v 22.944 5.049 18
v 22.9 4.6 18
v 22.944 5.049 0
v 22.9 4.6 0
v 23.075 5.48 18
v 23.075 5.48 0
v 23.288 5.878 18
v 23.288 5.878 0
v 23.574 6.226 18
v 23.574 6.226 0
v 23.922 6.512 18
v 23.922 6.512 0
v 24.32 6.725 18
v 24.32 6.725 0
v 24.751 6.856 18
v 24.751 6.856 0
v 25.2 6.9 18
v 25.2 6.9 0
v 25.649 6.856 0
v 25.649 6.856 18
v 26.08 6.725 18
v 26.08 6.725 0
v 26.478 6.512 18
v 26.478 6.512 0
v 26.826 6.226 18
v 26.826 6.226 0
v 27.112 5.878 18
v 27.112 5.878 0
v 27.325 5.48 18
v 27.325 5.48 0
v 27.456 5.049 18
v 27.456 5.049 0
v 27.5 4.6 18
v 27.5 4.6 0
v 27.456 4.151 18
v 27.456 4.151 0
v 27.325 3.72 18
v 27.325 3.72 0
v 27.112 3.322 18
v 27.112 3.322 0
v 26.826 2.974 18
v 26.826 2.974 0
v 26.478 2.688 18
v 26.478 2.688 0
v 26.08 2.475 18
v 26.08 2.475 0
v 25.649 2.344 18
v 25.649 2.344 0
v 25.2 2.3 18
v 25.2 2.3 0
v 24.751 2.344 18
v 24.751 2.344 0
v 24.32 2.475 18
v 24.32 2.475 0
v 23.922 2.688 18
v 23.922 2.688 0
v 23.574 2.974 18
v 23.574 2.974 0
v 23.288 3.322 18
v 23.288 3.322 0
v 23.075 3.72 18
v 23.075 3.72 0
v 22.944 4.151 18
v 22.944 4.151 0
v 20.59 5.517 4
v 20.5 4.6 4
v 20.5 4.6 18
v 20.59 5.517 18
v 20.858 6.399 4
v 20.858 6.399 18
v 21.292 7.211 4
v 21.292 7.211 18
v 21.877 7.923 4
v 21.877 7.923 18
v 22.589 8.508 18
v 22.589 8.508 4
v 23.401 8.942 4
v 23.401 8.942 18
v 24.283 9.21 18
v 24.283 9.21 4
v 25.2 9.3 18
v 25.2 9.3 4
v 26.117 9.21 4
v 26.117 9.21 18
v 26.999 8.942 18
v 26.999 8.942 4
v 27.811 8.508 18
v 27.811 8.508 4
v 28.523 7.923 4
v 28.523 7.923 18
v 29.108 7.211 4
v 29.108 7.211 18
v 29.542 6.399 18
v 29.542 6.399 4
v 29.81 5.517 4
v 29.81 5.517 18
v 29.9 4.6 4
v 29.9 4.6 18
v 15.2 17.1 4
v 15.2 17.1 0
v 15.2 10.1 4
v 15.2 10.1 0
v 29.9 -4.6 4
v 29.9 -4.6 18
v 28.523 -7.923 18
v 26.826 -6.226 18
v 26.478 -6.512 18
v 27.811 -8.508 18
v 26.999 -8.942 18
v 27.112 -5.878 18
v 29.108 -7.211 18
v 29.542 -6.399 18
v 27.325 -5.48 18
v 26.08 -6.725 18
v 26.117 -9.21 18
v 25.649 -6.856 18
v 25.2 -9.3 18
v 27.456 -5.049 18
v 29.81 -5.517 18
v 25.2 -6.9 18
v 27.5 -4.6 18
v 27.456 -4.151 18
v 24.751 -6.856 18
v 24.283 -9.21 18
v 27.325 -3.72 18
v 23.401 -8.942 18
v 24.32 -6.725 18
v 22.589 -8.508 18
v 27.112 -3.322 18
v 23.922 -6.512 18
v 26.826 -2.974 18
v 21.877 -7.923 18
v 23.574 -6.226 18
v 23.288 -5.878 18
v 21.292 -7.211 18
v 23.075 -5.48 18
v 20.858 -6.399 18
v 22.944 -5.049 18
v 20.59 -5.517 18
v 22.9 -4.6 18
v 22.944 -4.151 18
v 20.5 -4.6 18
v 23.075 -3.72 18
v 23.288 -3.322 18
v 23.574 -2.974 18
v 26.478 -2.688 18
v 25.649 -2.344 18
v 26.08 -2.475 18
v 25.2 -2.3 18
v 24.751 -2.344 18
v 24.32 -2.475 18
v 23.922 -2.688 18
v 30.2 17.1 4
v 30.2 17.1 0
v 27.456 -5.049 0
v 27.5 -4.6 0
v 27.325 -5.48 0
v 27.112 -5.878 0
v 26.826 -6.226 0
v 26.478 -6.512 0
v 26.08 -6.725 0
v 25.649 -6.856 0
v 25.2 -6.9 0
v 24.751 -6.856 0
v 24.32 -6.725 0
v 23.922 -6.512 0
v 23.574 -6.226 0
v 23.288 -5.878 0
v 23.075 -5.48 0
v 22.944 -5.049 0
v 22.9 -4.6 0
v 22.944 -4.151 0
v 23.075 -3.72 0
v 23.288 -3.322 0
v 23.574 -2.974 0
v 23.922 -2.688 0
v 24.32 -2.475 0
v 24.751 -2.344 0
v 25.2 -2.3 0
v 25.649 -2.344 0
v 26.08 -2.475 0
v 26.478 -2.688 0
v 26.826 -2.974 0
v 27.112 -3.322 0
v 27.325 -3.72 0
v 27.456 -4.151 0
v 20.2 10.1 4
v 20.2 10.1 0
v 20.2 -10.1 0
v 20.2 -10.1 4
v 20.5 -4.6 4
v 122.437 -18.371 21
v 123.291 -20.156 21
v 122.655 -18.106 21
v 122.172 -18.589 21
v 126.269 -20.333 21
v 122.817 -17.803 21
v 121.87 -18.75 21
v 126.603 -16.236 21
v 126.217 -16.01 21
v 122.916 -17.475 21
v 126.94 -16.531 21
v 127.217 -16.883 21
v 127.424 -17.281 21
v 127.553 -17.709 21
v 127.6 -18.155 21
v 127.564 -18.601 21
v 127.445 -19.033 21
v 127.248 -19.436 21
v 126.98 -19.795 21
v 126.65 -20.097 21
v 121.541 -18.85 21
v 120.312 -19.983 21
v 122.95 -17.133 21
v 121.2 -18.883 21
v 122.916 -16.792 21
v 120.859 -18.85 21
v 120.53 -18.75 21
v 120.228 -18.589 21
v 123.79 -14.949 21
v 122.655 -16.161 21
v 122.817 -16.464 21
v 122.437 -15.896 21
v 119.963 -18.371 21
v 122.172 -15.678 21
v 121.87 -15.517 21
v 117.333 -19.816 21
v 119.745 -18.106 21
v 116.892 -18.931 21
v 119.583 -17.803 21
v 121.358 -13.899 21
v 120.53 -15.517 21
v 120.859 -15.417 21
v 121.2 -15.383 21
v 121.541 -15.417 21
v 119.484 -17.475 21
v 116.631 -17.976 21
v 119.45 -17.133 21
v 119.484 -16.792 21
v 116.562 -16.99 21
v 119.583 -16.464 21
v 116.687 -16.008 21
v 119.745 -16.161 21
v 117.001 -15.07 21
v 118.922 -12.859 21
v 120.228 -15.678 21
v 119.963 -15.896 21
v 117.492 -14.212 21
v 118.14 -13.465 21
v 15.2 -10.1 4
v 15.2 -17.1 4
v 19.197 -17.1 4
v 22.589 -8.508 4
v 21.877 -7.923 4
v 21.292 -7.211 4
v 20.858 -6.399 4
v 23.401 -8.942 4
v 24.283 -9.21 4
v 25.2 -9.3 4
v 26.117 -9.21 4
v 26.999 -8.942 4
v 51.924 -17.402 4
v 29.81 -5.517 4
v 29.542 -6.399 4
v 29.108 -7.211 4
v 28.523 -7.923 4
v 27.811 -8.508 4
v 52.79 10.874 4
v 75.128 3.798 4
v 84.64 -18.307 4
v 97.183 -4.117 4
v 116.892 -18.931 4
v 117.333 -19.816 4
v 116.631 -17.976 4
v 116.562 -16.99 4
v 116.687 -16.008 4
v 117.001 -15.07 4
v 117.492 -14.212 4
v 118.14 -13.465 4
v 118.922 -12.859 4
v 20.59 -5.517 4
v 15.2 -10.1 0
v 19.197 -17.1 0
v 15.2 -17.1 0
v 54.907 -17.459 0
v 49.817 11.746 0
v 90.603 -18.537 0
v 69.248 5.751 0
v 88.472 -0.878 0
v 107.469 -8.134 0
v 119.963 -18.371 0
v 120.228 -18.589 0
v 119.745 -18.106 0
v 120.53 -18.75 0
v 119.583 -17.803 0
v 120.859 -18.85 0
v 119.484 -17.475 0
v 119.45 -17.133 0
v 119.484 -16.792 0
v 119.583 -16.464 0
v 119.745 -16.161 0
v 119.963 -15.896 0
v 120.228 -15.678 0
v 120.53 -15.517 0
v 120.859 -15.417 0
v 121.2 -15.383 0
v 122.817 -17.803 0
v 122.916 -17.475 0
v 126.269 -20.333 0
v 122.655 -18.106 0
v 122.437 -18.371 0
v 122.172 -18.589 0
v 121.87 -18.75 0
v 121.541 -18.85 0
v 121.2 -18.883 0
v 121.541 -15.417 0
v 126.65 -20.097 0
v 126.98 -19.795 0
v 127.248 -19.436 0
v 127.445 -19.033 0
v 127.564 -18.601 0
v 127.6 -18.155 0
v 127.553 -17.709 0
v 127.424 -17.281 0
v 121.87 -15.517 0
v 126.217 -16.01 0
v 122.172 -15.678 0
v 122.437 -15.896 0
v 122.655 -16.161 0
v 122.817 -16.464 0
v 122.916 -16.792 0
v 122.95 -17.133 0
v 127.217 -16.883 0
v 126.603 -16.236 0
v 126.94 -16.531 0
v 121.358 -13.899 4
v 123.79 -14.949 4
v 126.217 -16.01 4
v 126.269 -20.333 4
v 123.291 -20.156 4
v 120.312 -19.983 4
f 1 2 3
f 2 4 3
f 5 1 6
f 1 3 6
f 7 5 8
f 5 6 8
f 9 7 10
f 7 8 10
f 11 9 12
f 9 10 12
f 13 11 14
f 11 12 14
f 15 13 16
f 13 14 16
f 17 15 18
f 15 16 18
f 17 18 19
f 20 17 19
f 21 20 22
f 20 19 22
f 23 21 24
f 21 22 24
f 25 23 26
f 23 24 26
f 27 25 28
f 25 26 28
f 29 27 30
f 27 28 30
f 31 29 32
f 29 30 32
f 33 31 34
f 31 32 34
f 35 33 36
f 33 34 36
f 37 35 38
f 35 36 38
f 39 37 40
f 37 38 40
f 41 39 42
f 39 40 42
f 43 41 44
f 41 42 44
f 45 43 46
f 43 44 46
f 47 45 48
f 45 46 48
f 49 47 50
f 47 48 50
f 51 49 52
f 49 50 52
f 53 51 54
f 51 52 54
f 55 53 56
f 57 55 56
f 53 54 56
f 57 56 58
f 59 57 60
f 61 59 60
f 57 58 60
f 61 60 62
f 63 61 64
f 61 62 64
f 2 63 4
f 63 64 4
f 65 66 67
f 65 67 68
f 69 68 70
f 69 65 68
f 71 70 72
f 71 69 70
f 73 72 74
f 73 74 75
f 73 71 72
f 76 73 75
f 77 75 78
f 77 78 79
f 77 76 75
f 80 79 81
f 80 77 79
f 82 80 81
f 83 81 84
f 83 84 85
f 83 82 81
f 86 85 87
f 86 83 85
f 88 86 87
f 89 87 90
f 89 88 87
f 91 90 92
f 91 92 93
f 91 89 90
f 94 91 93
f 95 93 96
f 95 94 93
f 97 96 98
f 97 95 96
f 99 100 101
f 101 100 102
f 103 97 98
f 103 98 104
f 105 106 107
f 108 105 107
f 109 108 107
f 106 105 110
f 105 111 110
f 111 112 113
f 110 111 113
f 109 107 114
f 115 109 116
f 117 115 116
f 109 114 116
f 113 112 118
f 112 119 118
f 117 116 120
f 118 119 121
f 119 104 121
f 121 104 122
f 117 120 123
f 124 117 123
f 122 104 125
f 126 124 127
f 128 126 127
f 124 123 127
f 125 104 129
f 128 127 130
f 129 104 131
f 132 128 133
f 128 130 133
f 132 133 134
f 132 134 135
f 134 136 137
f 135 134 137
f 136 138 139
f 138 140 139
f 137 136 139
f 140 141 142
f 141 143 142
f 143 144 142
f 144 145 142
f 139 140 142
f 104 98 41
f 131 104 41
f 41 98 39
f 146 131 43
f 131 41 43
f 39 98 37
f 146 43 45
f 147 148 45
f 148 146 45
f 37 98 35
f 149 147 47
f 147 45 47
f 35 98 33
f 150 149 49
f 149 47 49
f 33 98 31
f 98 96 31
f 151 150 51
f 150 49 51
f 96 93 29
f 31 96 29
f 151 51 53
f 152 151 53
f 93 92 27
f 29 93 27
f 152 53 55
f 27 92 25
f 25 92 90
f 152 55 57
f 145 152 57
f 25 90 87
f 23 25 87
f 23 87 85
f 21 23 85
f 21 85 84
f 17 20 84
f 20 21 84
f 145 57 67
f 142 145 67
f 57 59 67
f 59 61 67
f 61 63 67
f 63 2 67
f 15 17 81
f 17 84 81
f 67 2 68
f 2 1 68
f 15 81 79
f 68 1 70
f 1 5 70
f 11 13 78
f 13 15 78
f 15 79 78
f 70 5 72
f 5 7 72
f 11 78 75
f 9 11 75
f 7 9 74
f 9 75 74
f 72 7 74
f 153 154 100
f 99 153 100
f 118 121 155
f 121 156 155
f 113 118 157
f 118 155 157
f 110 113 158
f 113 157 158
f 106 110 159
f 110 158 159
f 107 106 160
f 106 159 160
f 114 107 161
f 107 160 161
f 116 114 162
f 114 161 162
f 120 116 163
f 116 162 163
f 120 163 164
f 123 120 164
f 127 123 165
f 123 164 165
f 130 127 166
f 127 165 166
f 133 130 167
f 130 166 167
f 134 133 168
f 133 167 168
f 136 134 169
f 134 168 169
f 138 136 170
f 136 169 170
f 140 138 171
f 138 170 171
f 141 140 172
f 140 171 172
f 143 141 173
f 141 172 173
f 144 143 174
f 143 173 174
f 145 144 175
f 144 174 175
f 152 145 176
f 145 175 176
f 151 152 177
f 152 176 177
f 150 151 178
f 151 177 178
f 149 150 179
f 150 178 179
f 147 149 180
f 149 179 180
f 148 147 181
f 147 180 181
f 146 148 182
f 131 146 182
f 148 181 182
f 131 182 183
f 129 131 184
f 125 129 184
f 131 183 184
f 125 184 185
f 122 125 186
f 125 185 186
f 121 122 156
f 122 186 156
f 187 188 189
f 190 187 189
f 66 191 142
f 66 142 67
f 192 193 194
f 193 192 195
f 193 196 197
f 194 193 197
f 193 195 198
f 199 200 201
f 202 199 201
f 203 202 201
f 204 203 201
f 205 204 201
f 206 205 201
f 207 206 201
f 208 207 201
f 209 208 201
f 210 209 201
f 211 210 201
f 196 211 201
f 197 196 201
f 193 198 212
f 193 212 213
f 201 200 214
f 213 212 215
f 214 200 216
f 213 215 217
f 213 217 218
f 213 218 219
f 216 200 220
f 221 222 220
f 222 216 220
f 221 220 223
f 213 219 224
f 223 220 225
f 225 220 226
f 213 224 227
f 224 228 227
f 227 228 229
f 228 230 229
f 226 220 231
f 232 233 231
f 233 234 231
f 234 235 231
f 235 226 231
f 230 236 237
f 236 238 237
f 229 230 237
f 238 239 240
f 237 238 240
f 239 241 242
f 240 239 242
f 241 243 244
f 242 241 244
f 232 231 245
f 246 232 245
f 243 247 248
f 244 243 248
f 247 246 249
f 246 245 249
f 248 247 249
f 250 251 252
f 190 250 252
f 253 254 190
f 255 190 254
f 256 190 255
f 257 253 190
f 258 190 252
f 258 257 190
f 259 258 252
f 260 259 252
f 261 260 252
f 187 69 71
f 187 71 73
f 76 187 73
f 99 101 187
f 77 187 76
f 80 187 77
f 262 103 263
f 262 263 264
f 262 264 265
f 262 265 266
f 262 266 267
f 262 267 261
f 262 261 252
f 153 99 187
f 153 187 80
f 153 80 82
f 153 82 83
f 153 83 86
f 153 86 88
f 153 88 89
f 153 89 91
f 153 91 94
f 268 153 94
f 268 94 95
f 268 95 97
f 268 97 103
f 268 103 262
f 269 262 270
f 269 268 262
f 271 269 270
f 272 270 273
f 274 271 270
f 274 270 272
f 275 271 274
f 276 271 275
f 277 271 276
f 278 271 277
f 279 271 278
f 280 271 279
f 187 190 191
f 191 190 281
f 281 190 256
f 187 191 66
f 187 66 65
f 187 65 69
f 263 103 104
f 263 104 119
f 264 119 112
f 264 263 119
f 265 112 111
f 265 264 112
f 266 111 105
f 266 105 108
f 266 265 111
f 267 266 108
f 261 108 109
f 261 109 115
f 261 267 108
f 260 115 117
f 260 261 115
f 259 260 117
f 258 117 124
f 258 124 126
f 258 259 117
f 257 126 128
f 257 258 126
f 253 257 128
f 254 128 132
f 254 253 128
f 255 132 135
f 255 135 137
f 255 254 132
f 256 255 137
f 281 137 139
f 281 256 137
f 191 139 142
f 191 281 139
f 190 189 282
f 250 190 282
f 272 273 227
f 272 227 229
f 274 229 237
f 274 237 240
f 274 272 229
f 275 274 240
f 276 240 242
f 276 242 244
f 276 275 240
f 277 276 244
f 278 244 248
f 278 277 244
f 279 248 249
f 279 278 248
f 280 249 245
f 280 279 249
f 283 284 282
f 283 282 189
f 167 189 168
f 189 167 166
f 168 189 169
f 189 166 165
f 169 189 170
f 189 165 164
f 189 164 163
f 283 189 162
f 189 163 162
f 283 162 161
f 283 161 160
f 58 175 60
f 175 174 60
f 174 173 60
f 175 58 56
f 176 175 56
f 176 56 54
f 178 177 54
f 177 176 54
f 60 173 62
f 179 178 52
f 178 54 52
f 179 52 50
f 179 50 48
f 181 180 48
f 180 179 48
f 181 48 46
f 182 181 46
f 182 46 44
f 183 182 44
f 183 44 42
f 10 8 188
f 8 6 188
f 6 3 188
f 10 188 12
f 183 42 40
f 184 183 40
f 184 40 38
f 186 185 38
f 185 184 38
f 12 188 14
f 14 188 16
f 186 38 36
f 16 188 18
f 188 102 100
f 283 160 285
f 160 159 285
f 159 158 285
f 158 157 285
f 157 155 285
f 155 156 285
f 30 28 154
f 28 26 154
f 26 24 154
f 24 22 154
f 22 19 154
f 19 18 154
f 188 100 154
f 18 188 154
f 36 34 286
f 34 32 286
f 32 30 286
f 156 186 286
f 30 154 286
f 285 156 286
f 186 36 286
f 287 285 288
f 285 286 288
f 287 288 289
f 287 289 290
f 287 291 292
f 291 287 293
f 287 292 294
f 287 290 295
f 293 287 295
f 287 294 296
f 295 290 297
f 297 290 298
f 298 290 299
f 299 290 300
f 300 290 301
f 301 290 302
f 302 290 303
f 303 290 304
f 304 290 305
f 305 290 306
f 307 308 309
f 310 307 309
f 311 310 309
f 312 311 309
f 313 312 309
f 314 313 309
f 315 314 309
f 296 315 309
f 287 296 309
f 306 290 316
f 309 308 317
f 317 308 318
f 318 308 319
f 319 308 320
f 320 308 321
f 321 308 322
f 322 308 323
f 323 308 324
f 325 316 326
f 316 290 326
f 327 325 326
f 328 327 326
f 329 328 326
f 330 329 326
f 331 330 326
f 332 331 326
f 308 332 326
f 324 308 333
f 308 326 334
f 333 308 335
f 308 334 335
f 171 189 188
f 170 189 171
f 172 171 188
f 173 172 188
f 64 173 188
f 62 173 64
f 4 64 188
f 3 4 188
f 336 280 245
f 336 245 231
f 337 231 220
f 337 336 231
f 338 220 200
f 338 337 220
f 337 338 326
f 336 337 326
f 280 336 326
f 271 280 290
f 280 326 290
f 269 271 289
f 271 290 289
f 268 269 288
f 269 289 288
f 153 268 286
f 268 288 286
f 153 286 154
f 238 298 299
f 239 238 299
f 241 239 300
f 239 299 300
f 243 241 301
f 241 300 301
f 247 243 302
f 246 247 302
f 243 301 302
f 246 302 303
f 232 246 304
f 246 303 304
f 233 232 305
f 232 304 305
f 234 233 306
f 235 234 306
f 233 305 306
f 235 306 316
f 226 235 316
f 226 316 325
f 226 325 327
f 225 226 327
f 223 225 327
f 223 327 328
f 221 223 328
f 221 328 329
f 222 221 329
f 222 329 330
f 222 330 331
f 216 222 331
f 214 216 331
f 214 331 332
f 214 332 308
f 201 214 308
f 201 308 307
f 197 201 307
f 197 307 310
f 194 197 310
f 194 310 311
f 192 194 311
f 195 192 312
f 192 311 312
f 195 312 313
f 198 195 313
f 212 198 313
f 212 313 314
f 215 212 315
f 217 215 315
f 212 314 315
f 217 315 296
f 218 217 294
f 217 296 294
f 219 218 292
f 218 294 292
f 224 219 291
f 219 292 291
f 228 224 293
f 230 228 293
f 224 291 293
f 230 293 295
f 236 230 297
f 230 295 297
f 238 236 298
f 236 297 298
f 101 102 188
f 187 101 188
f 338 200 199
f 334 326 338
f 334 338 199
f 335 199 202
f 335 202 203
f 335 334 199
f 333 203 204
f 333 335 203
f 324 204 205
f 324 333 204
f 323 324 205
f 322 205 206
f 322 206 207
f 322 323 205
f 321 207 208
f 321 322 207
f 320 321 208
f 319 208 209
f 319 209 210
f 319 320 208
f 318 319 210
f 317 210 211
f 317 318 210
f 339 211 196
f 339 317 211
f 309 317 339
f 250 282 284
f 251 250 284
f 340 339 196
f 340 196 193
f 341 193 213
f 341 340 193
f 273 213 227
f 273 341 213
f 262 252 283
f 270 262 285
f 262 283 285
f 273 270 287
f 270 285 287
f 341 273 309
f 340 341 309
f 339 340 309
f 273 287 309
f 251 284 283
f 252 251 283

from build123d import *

# Parameters (mm, degrees)
SZKIC2_R                    = 2.3
DODANIE_WYCI_GNI_CIE1_DEPTH = 4
SZKIC3_R                    = 1.75
DODANIE_WYCI_GNI_CIE2_DEPTH = 17
DODANIE_WYCI_GNI_CIE3_DEPTH = 14
SZKIC6_R                    = 2.3
SZKIC6_R_2                  = 1.75
WYTNIJ_WYCI_GNI_CIE2_DEPTH  = 131.905876654


with BuildPart() as part:
    # Szkic2 → Dodanie-wyciągnięcie1 (new body)
    with BuildSketch(Plane.XY):
        with BuildLine():
            Line((15.2, 17.1), (15.2, 10.1))
            Line((15.2, 10.1), (20.2, 10.1))
            Line((20.2, 10.1), (20.2, -10.1))
            Line((20.2, -10.1), (15.2, -10.1))
            Line((15.2, -10.1), (15.2, -17.1))
            Line((15.2, -17.1), (19.197379501, -17.1))
            ThreePointArc((19.197379501, -17.1), (72.757727431, -17.908543704), (126.269263581, -20.333437957))
            ThreePointArc((126.269263581, -20.333437957), (127.600370297, -18.154974458), (126.216652739, -16.009543491))
            ThreePointArc((126.216652739, -16.009543491), (78.887653554, 2.515256091), (30.2, 17.1))
            Line((30.2, 17.1), (15.2, 17.1))
        make_face()
        with Locations(Location((25.2, 4.6, 0), (0, 0, 180))):
            Circle(SZKIC2_R, mode=Mode.SUBTRACT)
        with Locations((25.2, -4.6)):
            Circle(SZKIC2_R, mode=Mode.SUBTRACT)
    extrude(amount=DODANIE_WYCI_GNI_CIE1_DEPTH)

    # Szkic3 → Dodanie-wyciągnięcie2 (add)
    with BuildSketch(Plane.XY.offset(4)):
        with BuildLine():
            ThreePointArc((126.269263581, -20.333437957), (121.801544753, -20.069007105), (117.33317317, -19.815845914))
            ThreePointArc((117.33317317, -19.815845914), (116.687057134, -16.008461108), (118.922411718, -12.859360463))
            ThreePointArc((118.922411718, -12.859360463), (122.574580097, -14.42276365), (126.216652739, -16.009543491))
            ThreePointArc((126.216652739, -16.009543491), (127.600370297, -18.154974458), (126.269263581, -20.333437957))
        make_face()
        with Locations((121.2, -17.133437957)):
            Circle(SZKIC3_R, mode=Mode.SUBTRACT)
    extrude(amount=DODANIE_WYCI_GNI_CIE2_DEPTH)

    # Szkic5 → Dodanie-wyciągnięcie3 (add)
    with BuildSketch(Plane.XY.offset(4)):
        with BuildLine():
            Line((20.5, -4.6), (20.5, 4.6))
            ThreePointArc((20.5, 4.6), (25.2, 9.3), (29.9, 4.6))
            Line((29.9, 4.6), (29.9, -4.6))
            ThreePointArc((29.9, -4.6), (25.2, -9.3), (20.5, -4.6))
        make_face()
    extrude(amount=DODANIE_WYCI_GNI_CIE3_DEPTH)

    # Szkic6 → Wytnij-wyciągnięcie2 (cut, through all)
    with BuildSketch(Plane(origin=(0, 0, 0), x_dir=(-1, 0, 0), z_dir=(0, 0, -1))):
        with Locations(Location((-25.2, -4.6, 0), (0, 0, 180))):
            Circle(SZKIC6_R)
        with Locations((-25.2, 4.6)):
            Circle(SZKIC6_R)
        with Locations((-121.2, -17.133437957)):
            Circle(SZKIC6_R_2)
    extrude(amount=-WYTNIJ_WYCI_GNI_CIE2_DEPTH, mode=Mode.SUBTRACT)


solid = part.part
